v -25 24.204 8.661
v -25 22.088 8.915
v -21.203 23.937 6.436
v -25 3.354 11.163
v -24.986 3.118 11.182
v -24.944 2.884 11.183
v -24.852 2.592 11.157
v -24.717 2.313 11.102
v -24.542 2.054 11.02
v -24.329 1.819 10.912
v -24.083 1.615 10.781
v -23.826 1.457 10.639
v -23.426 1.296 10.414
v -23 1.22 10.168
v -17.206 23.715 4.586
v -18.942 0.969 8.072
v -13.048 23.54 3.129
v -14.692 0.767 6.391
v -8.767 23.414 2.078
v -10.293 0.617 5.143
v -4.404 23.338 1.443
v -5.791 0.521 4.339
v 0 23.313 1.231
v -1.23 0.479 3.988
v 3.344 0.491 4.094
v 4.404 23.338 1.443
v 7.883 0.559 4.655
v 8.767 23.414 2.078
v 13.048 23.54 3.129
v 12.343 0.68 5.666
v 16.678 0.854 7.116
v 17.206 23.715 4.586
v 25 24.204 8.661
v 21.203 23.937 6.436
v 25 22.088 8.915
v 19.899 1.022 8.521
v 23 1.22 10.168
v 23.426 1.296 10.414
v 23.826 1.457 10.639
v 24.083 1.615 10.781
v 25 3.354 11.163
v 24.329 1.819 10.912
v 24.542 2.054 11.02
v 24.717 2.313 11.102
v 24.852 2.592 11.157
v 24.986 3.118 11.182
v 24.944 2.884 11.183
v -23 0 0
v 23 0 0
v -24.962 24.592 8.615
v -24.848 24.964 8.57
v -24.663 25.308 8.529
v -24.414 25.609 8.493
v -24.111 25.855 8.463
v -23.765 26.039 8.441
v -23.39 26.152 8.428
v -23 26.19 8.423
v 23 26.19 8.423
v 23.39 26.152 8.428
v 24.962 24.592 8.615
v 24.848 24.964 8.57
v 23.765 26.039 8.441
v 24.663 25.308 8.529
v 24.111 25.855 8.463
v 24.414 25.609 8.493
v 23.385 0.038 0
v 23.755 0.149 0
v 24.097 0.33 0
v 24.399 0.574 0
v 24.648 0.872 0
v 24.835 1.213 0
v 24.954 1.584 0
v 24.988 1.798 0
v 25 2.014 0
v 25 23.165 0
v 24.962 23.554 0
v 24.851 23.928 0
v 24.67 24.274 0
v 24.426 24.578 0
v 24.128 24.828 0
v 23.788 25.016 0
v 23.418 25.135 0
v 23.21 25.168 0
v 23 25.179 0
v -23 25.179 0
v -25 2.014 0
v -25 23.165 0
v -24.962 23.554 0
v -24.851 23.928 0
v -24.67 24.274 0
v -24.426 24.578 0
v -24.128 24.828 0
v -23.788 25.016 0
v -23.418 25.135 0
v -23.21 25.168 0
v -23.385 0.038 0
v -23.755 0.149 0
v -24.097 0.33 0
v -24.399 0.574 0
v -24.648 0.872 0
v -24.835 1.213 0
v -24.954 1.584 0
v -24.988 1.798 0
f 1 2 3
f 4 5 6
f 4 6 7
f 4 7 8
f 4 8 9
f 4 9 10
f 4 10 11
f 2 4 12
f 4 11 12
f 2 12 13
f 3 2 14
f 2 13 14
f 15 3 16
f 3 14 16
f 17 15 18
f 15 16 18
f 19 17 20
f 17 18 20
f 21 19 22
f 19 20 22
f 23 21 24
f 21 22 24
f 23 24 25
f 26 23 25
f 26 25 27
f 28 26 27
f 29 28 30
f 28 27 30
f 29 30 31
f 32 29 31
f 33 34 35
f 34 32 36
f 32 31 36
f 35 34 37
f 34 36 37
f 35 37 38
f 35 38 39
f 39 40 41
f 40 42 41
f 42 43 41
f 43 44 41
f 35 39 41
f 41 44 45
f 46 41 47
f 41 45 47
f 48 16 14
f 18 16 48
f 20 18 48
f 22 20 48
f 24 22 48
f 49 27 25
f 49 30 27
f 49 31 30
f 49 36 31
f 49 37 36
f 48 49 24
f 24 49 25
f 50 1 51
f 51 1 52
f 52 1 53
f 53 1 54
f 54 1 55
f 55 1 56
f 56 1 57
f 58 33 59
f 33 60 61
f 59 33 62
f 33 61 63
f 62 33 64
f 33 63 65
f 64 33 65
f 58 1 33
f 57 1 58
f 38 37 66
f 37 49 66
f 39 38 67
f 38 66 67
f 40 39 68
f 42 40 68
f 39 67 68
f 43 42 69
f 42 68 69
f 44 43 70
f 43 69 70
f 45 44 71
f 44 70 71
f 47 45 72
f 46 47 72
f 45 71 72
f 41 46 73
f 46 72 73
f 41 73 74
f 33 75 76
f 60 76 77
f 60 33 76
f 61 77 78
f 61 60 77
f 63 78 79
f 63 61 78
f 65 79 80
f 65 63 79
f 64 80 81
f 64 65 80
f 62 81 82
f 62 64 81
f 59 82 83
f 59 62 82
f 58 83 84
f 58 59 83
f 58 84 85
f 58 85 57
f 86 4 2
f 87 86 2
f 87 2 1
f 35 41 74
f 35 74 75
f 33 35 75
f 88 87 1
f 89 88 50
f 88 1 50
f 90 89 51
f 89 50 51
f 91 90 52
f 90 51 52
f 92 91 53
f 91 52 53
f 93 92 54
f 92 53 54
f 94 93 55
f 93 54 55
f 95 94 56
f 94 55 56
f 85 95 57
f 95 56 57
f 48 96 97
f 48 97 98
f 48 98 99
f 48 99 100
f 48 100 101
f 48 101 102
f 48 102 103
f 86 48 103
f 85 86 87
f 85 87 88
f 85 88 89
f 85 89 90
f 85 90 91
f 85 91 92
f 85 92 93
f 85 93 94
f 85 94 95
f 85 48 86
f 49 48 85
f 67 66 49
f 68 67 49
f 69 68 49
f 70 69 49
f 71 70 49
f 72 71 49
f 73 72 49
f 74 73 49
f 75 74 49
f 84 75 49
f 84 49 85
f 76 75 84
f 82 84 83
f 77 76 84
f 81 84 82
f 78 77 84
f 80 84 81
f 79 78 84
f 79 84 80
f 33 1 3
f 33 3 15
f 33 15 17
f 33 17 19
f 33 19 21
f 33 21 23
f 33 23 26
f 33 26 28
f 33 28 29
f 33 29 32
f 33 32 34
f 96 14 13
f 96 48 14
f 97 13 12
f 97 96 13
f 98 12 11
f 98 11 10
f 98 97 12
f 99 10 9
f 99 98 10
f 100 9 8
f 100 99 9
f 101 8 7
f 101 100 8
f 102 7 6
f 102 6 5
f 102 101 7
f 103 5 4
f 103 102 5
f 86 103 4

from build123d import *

# Parameters (mm, degrees)
F1_DEPTH      = 25
F1_DEPTH_BACK = 25
F2_R          = 45.5
F3_DEPTH      = 23
F5_DEPTH      = 50.001
F6_R          = 2


with BuildPart() as f1:
    # F0 (on Right) → F1 (new body, two sides)
    with BuildSketch(Plane.YZ) as f1_sk:
        Polygon((3, 25), (0, 0), (25.179357, 0), (28.179357, 25), align=None)
    extrude(amount=F1_DEPTH)
    extrude(f1_sk.sketch, amount=-F1_DEPTH_BACK)

    # F2 (on face) → F3 (cut)
    with BuildSketch(Plane(origin=(0, 0, 0), x_dir=(1, 0, 0), z_dir=(0, -0.992877, 0.119145))):
        with Locations((0, 49.5)):
            Circle(F2_R)
    extrude(amount=-F3_DEPTH, mode=Mode.SUBTRACT)

    # F4 (on face) → F5 (cut, through all)
    with BuildSketch(Plane.YZ.offset(25)):
        Polygon((39.125659, 25), (24.232506, 26.787178), (22.087892, 8.915395), (36.981045, 7.128217), align=None)
    extrude(amount=-F5_DEPTH, mode=Mode.SUBTRACT)

    # F6
    f6_edges = [f1.edges().sort_by_distance(p)[0] for p in [
        (-25, 0.684105, 5.700878),
        (25, 0.684105, 5.700878),
        (25, 25.684744, 4.211563),
        (-25, 25.684744, 4.211563),
    ]]
    fillet(f6_edges, radius=F6_R)


solid = f1.part
